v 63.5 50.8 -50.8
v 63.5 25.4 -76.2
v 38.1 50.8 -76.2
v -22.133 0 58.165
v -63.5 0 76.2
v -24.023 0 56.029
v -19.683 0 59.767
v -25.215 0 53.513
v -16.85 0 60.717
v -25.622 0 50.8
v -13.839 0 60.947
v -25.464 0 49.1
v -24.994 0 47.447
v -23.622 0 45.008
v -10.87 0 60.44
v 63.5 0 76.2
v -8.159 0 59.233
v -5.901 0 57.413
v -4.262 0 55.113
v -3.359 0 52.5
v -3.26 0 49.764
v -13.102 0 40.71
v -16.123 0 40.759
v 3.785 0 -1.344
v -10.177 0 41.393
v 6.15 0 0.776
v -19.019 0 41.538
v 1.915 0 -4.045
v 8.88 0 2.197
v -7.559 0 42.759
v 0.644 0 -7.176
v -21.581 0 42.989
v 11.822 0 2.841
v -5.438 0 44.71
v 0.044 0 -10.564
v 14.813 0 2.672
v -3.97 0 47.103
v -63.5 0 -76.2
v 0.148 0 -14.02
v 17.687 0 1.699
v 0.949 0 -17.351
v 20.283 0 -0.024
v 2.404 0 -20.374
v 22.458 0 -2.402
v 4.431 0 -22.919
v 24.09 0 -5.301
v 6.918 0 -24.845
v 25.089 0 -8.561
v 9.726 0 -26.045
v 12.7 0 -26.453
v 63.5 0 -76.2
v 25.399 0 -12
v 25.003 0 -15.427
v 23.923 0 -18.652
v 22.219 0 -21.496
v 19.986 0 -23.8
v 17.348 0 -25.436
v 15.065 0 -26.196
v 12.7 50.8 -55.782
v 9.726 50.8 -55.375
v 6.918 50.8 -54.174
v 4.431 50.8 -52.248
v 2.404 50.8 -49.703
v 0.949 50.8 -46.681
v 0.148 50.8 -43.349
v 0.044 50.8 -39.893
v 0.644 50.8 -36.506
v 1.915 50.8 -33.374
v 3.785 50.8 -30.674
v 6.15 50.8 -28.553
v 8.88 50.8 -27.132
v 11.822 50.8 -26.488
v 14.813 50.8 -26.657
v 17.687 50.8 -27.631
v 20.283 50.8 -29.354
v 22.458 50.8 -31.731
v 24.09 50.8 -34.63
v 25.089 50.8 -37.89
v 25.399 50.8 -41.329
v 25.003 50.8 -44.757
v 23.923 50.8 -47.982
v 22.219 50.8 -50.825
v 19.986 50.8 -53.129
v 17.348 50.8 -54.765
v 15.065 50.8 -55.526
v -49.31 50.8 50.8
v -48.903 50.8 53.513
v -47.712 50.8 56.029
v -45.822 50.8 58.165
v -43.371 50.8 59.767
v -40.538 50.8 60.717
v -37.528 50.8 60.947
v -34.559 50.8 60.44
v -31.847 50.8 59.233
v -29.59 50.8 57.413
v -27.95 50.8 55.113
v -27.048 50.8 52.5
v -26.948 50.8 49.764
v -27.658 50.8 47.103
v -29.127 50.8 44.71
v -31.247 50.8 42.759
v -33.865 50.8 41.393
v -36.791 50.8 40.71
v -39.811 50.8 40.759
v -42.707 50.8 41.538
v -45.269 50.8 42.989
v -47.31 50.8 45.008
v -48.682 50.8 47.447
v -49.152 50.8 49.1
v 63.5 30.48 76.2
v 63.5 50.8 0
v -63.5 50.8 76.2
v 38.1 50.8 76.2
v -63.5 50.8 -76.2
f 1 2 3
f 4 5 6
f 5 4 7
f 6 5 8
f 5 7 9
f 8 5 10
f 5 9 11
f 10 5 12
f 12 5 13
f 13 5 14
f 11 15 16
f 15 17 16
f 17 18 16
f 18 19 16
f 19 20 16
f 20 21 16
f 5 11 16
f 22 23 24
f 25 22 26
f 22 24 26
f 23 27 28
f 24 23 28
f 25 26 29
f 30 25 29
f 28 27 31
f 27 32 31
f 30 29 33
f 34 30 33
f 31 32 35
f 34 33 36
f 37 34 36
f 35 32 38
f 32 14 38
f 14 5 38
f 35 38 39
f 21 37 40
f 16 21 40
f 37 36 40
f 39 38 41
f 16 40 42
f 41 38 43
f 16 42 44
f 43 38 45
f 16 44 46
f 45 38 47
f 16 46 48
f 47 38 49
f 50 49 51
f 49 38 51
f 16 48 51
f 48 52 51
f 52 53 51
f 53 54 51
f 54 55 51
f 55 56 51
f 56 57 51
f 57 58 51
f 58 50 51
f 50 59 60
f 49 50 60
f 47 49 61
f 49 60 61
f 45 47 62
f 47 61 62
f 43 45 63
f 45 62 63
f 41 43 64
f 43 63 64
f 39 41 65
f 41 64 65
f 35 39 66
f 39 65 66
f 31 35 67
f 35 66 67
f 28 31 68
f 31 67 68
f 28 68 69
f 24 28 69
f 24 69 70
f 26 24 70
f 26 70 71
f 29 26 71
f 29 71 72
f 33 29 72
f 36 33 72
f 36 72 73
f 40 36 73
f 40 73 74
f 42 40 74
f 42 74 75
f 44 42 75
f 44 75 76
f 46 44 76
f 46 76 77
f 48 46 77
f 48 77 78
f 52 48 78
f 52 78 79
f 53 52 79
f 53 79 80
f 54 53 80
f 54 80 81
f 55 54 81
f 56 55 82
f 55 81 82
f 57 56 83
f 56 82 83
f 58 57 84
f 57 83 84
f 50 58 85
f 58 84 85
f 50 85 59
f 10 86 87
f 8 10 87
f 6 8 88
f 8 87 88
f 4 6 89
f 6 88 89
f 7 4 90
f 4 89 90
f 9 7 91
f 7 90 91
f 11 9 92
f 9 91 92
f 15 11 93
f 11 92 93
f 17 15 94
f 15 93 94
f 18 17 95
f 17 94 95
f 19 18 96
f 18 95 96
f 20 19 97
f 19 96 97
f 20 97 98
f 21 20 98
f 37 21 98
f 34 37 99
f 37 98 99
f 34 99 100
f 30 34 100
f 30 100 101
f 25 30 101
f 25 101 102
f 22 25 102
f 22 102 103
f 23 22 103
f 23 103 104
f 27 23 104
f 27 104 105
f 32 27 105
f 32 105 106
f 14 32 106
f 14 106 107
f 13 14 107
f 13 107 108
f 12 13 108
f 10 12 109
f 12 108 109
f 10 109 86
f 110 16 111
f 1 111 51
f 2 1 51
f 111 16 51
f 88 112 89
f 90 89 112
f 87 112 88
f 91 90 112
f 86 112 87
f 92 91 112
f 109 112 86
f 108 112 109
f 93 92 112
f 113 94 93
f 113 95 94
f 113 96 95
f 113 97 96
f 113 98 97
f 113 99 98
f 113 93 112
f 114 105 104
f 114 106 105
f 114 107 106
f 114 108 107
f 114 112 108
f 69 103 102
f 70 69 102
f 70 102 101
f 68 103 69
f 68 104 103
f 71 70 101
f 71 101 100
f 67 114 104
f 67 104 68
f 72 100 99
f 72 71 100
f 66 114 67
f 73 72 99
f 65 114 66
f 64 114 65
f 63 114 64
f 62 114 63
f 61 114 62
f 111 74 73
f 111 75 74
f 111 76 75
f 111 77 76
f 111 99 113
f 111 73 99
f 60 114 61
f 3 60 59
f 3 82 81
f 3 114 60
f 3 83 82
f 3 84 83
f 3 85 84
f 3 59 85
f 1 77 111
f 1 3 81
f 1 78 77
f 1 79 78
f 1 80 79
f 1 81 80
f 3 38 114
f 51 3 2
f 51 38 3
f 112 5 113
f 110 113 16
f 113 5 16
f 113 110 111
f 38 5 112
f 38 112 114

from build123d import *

# Parameters (mm, degrees)
SKETCH1_W           = 127
SKETCH1_H           = 152.4
BOSS_EXTRUDE1_DEPTH = 50.8
CUT_EXTRUDE1_DEPTH  = 156.939365922
CUT_EXTRUDE2_DEPTH  = 186.205309499
SKETCH6_R           = 10.16
CUT_EXTRUDE3_DEPTH  = 139.062227017
SKETCH7_R           = 12.7
CUT_EXTRUDE4_DEPTH  = 152.108237347


with BuildPart() as part:
    # Sketch1 → Boss-Extrude1 (new body)
    with BuildSketch(Plane(origin=(0, 0, 0), x_dir=(1, 0, 0), z_dir=(0, 1, 0))):
        Rectangle(SKETCH1_W, SKETCH1_H)
    extrude(amount=BOSS_EXTRUDE1_DEPTH)

    # Sketch3 → Cut-Extrude1 (cut, through all)
    with BuildSketch(Plane(origin=(47.501298701, 59.376623377, 15.833766234), x_dir=(0.7911852033335974, -0.5909267078840147, -0.1575804554357373), z_dir=(0.6115766297251508, 0.7644707871564383, 0.20385887657505028))):
        Polygon((-11.882551218, -60.537839749), (20.221183651, 13.089262648), (20.221183651, -65.773544809), align=None)
    extrude(amount=CUT_EXTRUDE1_DEPTH, mode=Mode.SUBTRACT)

    # Sketch4 → Cut-Extrude2 (cut, through all)
    with BuildSketch(Plane(origin=(55.033333333, 55.033333333, -55.033333333), x_dir=(0.816496580927726, -0.40824829046386363, 0.40824829046386246), z_dir=(0.5773502691896258, 0.577350269189627, -0.5773502691896246))):
        Polygon((-20.739013156, 17.960512242), (10.369506578, 35.921024484), (10.369506578, 0), align=None)
    extrude(amount=CUT_EXTRUDE2_DEPTH, mode=Mode.SUBTRACT)

    # Sketch6 → Cut-Extrude3 (cut, through all)
    with BuildSketch(Plane(origin=(-30.799022248, 66.048716355, 0), x_dir=(0, 0, 1), z_dir=(-0.4226182617407003, 0.9063077870366496, 0))):
        with Locations(Location((50.8, -13.06131899, 0), (0, 0, 270))):
            Circle(SKETCH6_R)
    extrude(amount=-CUT_EXTRUDE3_DEPTH, mode=Mode.SUBTRACT)

    # Sketch7 → Cut-Extrude4 (cut, through all)
    with BuildSketch(Plane(origin=(0, 71.095567884, -41.047045256), x_dir=(-1, 0, 0), z_dir=(0, 0.866025403784438, -0.500000000000001))):
        with Locations(Location((-12.7, -10.208864232, 0), (0, 0, 270))):
            Circle(SKETCH7_R)
    extrude(amount=-CUT_EXTRUDE4_DEPTH, mode=Mode.SUBTRACT)


solid = part.part
